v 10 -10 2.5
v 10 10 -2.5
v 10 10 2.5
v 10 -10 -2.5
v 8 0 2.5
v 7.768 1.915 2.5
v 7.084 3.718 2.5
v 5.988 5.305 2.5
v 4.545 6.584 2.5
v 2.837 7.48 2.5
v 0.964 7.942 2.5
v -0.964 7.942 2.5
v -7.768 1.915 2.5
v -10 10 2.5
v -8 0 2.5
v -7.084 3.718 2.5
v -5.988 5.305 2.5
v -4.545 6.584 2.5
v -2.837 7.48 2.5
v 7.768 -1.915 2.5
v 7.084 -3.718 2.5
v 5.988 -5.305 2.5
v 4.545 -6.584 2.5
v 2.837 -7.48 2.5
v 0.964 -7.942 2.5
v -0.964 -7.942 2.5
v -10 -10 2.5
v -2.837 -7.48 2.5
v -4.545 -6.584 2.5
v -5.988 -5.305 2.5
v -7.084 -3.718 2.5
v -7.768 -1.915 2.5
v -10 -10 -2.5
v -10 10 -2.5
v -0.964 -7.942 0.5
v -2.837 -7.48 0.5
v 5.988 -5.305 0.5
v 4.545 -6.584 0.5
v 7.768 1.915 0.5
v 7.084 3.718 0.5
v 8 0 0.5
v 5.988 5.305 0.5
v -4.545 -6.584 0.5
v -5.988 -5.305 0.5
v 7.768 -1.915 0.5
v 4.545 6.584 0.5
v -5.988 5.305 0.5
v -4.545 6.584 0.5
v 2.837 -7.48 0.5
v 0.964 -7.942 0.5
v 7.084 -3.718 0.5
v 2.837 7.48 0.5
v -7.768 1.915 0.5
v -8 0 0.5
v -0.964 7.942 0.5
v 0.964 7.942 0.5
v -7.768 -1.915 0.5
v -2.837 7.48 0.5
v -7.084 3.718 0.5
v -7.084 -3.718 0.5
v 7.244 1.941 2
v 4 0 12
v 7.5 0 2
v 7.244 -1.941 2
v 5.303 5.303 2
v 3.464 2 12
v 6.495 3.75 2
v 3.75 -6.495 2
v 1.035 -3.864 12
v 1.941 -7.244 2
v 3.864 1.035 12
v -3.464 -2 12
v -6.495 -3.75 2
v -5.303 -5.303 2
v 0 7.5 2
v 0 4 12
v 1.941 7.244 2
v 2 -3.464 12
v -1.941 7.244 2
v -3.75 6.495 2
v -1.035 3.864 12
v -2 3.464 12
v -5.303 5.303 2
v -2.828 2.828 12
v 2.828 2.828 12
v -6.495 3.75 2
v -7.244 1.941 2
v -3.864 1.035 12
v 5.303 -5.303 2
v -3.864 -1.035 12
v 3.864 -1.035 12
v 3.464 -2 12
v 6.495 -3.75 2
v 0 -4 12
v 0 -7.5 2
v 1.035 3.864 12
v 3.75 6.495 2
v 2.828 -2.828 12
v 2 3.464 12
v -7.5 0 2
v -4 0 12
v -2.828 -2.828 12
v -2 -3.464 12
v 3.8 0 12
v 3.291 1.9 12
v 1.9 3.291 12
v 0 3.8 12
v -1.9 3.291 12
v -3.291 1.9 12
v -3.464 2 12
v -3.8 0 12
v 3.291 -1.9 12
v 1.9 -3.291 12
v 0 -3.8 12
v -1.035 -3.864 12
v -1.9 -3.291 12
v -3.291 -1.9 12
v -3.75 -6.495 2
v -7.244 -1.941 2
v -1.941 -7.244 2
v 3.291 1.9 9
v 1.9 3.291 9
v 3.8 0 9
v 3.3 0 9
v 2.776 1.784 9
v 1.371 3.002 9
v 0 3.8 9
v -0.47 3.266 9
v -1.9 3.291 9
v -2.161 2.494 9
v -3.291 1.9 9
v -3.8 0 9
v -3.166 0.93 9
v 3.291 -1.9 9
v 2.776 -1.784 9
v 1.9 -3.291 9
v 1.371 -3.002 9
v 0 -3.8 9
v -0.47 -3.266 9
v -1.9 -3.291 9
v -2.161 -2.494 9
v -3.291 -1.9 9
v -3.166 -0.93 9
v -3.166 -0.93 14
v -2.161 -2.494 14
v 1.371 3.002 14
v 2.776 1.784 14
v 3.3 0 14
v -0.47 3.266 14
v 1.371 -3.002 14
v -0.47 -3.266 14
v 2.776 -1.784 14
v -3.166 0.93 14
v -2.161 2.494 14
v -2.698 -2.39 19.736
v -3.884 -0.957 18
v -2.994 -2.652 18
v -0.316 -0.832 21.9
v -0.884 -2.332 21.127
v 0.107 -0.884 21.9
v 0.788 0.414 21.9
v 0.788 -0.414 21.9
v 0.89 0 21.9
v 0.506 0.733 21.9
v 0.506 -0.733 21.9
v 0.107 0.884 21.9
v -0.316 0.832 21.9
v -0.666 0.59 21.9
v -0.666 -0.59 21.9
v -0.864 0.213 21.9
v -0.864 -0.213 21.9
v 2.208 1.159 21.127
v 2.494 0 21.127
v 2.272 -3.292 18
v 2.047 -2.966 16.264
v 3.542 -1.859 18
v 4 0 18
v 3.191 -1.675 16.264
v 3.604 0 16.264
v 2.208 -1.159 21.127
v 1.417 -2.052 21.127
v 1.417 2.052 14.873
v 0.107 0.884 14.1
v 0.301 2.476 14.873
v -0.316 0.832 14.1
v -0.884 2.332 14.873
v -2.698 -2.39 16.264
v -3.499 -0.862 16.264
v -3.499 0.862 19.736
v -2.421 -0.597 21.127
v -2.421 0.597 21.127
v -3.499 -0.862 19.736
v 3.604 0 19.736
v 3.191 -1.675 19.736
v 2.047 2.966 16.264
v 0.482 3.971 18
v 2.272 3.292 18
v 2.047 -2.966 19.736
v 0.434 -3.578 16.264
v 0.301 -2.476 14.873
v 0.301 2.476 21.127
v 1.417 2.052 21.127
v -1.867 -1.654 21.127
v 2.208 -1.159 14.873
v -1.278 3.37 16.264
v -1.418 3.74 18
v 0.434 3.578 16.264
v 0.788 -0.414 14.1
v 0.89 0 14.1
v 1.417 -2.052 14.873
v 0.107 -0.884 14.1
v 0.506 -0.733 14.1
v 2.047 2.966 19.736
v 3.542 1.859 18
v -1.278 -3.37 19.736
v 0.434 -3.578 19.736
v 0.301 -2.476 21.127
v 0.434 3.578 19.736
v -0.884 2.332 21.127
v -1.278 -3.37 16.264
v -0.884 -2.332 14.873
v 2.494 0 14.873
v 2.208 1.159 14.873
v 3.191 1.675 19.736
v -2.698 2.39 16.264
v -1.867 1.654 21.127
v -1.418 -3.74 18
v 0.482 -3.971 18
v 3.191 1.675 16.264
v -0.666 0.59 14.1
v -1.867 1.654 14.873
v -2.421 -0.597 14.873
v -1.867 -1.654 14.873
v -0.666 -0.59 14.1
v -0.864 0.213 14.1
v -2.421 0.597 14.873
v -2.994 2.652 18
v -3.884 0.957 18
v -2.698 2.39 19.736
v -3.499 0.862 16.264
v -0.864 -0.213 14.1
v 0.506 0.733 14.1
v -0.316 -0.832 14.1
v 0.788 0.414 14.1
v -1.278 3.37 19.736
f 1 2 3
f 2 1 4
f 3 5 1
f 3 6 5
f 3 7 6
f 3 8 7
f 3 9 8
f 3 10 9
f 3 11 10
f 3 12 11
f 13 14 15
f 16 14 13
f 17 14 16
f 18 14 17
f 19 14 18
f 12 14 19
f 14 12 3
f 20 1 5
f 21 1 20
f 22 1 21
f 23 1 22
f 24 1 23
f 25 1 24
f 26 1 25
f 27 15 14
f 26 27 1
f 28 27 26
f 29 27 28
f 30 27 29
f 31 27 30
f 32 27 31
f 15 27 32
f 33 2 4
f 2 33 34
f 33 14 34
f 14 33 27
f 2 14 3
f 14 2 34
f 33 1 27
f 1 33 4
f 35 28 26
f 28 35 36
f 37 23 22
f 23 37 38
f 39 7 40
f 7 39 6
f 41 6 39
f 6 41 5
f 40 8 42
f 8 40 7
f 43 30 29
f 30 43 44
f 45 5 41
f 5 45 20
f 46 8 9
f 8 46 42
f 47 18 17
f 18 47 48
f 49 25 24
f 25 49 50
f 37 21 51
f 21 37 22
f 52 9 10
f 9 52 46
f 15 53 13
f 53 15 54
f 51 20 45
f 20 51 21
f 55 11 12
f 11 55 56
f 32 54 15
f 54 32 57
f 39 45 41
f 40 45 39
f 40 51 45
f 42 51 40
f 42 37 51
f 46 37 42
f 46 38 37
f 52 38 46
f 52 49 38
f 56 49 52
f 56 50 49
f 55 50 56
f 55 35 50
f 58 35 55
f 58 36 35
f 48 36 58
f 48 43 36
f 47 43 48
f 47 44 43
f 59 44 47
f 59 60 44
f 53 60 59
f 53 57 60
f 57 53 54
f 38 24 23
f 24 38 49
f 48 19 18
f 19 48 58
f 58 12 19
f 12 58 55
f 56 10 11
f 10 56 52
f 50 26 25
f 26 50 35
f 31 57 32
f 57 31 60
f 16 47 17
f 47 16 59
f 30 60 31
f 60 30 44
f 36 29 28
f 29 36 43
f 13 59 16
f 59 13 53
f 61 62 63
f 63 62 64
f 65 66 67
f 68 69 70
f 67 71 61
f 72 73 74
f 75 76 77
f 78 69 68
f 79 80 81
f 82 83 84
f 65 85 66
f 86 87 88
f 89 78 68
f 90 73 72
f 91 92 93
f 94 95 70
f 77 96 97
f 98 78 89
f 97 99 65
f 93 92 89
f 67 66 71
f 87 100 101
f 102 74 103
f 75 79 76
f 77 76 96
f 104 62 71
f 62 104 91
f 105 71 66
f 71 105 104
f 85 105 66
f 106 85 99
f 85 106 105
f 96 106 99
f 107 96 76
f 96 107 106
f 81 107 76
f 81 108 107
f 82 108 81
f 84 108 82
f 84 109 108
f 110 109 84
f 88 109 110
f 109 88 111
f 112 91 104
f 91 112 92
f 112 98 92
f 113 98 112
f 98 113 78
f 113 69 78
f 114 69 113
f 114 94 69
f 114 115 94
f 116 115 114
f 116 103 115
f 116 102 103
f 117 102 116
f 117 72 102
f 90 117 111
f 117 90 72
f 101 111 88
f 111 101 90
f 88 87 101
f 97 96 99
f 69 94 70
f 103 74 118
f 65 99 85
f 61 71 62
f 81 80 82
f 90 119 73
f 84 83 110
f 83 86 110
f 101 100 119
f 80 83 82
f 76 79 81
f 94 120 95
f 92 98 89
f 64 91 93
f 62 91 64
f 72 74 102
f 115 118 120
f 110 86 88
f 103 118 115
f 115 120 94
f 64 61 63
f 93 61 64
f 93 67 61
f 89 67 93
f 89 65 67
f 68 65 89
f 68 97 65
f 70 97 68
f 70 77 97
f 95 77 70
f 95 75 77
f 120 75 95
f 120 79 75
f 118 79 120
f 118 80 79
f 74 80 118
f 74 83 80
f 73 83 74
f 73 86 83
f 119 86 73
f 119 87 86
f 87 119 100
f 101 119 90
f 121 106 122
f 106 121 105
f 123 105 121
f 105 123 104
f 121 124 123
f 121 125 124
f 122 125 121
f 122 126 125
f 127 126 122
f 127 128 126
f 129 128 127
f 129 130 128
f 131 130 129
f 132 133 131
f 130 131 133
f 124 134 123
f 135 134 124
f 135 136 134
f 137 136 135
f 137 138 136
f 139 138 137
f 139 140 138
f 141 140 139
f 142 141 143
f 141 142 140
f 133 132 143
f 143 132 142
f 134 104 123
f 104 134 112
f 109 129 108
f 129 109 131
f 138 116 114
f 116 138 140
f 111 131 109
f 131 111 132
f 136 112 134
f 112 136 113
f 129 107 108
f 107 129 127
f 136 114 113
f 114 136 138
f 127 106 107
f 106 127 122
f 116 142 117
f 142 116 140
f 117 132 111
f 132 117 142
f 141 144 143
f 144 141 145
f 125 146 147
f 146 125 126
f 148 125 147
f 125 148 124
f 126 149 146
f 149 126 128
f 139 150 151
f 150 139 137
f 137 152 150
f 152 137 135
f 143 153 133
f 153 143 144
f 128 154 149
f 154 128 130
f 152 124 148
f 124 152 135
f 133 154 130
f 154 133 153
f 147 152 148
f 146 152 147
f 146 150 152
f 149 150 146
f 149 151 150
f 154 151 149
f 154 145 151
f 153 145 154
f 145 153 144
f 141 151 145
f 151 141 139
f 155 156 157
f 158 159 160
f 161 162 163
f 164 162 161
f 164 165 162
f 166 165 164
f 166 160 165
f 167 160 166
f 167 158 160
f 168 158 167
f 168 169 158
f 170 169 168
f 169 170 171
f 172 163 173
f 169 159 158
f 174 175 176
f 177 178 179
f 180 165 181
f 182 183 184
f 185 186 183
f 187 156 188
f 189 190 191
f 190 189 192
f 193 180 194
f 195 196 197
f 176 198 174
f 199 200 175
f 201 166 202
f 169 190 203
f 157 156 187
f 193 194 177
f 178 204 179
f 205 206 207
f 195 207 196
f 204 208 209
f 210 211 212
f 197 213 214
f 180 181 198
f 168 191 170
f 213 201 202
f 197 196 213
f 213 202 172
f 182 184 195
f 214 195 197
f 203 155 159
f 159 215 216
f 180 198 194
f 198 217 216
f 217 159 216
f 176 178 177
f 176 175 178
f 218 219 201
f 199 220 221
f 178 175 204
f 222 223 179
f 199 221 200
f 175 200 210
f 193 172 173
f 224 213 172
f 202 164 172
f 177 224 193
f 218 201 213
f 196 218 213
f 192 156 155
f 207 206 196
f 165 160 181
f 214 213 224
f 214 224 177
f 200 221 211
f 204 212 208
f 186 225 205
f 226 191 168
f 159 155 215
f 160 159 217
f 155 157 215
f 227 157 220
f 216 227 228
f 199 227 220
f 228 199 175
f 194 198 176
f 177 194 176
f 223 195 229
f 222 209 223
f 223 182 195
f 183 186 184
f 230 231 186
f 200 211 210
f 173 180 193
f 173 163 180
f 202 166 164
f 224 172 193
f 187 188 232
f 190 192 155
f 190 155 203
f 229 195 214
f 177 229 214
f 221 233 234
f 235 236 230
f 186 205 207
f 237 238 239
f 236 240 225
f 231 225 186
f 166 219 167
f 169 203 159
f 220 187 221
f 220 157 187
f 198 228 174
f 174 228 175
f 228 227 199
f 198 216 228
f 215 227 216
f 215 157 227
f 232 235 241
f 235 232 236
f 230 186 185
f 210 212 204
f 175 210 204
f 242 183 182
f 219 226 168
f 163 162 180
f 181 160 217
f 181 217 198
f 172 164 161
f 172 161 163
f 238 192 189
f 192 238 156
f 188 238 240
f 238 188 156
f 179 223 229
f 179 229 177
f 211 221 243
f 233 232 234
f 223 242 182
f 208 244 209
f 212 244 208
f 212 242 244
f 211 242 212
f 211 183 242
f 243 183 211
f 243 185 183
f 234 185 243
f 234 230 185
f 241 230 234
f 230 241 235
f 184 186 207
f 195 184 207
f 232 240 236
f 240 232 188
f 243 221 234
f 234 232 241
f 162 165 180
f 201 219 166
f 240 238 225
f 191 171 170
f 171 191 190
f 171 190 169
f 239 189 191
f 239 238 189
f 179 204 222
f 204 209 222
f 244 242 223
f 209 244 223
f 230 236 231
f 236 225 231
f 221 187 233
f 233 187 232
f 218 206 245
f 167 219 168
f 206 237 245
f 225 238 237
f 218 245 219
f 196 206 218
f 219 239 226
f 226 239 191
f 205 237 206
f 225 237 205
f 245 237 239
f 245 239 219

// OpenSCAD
difference(){
cube([ 20, 20 , 5], center = true);
    translate([ 0,0,2 ])
        cylinder( h = 3, r = 8, center = true);
}


translate([ 0,0,10/2 + 2])
    difference(){
        cylinder( h = 10, r1 = 7.5, r2 = 4, center = true);
        translate([ 0, 0, 10])
            cylinder( h = 16, r = 3.8, center= true);
    }

   translate([ 0,0,10])
        cylinder( h = 8, r = 3.3,center = true);
        translate([ 0,0,18])
        sphere(4);
